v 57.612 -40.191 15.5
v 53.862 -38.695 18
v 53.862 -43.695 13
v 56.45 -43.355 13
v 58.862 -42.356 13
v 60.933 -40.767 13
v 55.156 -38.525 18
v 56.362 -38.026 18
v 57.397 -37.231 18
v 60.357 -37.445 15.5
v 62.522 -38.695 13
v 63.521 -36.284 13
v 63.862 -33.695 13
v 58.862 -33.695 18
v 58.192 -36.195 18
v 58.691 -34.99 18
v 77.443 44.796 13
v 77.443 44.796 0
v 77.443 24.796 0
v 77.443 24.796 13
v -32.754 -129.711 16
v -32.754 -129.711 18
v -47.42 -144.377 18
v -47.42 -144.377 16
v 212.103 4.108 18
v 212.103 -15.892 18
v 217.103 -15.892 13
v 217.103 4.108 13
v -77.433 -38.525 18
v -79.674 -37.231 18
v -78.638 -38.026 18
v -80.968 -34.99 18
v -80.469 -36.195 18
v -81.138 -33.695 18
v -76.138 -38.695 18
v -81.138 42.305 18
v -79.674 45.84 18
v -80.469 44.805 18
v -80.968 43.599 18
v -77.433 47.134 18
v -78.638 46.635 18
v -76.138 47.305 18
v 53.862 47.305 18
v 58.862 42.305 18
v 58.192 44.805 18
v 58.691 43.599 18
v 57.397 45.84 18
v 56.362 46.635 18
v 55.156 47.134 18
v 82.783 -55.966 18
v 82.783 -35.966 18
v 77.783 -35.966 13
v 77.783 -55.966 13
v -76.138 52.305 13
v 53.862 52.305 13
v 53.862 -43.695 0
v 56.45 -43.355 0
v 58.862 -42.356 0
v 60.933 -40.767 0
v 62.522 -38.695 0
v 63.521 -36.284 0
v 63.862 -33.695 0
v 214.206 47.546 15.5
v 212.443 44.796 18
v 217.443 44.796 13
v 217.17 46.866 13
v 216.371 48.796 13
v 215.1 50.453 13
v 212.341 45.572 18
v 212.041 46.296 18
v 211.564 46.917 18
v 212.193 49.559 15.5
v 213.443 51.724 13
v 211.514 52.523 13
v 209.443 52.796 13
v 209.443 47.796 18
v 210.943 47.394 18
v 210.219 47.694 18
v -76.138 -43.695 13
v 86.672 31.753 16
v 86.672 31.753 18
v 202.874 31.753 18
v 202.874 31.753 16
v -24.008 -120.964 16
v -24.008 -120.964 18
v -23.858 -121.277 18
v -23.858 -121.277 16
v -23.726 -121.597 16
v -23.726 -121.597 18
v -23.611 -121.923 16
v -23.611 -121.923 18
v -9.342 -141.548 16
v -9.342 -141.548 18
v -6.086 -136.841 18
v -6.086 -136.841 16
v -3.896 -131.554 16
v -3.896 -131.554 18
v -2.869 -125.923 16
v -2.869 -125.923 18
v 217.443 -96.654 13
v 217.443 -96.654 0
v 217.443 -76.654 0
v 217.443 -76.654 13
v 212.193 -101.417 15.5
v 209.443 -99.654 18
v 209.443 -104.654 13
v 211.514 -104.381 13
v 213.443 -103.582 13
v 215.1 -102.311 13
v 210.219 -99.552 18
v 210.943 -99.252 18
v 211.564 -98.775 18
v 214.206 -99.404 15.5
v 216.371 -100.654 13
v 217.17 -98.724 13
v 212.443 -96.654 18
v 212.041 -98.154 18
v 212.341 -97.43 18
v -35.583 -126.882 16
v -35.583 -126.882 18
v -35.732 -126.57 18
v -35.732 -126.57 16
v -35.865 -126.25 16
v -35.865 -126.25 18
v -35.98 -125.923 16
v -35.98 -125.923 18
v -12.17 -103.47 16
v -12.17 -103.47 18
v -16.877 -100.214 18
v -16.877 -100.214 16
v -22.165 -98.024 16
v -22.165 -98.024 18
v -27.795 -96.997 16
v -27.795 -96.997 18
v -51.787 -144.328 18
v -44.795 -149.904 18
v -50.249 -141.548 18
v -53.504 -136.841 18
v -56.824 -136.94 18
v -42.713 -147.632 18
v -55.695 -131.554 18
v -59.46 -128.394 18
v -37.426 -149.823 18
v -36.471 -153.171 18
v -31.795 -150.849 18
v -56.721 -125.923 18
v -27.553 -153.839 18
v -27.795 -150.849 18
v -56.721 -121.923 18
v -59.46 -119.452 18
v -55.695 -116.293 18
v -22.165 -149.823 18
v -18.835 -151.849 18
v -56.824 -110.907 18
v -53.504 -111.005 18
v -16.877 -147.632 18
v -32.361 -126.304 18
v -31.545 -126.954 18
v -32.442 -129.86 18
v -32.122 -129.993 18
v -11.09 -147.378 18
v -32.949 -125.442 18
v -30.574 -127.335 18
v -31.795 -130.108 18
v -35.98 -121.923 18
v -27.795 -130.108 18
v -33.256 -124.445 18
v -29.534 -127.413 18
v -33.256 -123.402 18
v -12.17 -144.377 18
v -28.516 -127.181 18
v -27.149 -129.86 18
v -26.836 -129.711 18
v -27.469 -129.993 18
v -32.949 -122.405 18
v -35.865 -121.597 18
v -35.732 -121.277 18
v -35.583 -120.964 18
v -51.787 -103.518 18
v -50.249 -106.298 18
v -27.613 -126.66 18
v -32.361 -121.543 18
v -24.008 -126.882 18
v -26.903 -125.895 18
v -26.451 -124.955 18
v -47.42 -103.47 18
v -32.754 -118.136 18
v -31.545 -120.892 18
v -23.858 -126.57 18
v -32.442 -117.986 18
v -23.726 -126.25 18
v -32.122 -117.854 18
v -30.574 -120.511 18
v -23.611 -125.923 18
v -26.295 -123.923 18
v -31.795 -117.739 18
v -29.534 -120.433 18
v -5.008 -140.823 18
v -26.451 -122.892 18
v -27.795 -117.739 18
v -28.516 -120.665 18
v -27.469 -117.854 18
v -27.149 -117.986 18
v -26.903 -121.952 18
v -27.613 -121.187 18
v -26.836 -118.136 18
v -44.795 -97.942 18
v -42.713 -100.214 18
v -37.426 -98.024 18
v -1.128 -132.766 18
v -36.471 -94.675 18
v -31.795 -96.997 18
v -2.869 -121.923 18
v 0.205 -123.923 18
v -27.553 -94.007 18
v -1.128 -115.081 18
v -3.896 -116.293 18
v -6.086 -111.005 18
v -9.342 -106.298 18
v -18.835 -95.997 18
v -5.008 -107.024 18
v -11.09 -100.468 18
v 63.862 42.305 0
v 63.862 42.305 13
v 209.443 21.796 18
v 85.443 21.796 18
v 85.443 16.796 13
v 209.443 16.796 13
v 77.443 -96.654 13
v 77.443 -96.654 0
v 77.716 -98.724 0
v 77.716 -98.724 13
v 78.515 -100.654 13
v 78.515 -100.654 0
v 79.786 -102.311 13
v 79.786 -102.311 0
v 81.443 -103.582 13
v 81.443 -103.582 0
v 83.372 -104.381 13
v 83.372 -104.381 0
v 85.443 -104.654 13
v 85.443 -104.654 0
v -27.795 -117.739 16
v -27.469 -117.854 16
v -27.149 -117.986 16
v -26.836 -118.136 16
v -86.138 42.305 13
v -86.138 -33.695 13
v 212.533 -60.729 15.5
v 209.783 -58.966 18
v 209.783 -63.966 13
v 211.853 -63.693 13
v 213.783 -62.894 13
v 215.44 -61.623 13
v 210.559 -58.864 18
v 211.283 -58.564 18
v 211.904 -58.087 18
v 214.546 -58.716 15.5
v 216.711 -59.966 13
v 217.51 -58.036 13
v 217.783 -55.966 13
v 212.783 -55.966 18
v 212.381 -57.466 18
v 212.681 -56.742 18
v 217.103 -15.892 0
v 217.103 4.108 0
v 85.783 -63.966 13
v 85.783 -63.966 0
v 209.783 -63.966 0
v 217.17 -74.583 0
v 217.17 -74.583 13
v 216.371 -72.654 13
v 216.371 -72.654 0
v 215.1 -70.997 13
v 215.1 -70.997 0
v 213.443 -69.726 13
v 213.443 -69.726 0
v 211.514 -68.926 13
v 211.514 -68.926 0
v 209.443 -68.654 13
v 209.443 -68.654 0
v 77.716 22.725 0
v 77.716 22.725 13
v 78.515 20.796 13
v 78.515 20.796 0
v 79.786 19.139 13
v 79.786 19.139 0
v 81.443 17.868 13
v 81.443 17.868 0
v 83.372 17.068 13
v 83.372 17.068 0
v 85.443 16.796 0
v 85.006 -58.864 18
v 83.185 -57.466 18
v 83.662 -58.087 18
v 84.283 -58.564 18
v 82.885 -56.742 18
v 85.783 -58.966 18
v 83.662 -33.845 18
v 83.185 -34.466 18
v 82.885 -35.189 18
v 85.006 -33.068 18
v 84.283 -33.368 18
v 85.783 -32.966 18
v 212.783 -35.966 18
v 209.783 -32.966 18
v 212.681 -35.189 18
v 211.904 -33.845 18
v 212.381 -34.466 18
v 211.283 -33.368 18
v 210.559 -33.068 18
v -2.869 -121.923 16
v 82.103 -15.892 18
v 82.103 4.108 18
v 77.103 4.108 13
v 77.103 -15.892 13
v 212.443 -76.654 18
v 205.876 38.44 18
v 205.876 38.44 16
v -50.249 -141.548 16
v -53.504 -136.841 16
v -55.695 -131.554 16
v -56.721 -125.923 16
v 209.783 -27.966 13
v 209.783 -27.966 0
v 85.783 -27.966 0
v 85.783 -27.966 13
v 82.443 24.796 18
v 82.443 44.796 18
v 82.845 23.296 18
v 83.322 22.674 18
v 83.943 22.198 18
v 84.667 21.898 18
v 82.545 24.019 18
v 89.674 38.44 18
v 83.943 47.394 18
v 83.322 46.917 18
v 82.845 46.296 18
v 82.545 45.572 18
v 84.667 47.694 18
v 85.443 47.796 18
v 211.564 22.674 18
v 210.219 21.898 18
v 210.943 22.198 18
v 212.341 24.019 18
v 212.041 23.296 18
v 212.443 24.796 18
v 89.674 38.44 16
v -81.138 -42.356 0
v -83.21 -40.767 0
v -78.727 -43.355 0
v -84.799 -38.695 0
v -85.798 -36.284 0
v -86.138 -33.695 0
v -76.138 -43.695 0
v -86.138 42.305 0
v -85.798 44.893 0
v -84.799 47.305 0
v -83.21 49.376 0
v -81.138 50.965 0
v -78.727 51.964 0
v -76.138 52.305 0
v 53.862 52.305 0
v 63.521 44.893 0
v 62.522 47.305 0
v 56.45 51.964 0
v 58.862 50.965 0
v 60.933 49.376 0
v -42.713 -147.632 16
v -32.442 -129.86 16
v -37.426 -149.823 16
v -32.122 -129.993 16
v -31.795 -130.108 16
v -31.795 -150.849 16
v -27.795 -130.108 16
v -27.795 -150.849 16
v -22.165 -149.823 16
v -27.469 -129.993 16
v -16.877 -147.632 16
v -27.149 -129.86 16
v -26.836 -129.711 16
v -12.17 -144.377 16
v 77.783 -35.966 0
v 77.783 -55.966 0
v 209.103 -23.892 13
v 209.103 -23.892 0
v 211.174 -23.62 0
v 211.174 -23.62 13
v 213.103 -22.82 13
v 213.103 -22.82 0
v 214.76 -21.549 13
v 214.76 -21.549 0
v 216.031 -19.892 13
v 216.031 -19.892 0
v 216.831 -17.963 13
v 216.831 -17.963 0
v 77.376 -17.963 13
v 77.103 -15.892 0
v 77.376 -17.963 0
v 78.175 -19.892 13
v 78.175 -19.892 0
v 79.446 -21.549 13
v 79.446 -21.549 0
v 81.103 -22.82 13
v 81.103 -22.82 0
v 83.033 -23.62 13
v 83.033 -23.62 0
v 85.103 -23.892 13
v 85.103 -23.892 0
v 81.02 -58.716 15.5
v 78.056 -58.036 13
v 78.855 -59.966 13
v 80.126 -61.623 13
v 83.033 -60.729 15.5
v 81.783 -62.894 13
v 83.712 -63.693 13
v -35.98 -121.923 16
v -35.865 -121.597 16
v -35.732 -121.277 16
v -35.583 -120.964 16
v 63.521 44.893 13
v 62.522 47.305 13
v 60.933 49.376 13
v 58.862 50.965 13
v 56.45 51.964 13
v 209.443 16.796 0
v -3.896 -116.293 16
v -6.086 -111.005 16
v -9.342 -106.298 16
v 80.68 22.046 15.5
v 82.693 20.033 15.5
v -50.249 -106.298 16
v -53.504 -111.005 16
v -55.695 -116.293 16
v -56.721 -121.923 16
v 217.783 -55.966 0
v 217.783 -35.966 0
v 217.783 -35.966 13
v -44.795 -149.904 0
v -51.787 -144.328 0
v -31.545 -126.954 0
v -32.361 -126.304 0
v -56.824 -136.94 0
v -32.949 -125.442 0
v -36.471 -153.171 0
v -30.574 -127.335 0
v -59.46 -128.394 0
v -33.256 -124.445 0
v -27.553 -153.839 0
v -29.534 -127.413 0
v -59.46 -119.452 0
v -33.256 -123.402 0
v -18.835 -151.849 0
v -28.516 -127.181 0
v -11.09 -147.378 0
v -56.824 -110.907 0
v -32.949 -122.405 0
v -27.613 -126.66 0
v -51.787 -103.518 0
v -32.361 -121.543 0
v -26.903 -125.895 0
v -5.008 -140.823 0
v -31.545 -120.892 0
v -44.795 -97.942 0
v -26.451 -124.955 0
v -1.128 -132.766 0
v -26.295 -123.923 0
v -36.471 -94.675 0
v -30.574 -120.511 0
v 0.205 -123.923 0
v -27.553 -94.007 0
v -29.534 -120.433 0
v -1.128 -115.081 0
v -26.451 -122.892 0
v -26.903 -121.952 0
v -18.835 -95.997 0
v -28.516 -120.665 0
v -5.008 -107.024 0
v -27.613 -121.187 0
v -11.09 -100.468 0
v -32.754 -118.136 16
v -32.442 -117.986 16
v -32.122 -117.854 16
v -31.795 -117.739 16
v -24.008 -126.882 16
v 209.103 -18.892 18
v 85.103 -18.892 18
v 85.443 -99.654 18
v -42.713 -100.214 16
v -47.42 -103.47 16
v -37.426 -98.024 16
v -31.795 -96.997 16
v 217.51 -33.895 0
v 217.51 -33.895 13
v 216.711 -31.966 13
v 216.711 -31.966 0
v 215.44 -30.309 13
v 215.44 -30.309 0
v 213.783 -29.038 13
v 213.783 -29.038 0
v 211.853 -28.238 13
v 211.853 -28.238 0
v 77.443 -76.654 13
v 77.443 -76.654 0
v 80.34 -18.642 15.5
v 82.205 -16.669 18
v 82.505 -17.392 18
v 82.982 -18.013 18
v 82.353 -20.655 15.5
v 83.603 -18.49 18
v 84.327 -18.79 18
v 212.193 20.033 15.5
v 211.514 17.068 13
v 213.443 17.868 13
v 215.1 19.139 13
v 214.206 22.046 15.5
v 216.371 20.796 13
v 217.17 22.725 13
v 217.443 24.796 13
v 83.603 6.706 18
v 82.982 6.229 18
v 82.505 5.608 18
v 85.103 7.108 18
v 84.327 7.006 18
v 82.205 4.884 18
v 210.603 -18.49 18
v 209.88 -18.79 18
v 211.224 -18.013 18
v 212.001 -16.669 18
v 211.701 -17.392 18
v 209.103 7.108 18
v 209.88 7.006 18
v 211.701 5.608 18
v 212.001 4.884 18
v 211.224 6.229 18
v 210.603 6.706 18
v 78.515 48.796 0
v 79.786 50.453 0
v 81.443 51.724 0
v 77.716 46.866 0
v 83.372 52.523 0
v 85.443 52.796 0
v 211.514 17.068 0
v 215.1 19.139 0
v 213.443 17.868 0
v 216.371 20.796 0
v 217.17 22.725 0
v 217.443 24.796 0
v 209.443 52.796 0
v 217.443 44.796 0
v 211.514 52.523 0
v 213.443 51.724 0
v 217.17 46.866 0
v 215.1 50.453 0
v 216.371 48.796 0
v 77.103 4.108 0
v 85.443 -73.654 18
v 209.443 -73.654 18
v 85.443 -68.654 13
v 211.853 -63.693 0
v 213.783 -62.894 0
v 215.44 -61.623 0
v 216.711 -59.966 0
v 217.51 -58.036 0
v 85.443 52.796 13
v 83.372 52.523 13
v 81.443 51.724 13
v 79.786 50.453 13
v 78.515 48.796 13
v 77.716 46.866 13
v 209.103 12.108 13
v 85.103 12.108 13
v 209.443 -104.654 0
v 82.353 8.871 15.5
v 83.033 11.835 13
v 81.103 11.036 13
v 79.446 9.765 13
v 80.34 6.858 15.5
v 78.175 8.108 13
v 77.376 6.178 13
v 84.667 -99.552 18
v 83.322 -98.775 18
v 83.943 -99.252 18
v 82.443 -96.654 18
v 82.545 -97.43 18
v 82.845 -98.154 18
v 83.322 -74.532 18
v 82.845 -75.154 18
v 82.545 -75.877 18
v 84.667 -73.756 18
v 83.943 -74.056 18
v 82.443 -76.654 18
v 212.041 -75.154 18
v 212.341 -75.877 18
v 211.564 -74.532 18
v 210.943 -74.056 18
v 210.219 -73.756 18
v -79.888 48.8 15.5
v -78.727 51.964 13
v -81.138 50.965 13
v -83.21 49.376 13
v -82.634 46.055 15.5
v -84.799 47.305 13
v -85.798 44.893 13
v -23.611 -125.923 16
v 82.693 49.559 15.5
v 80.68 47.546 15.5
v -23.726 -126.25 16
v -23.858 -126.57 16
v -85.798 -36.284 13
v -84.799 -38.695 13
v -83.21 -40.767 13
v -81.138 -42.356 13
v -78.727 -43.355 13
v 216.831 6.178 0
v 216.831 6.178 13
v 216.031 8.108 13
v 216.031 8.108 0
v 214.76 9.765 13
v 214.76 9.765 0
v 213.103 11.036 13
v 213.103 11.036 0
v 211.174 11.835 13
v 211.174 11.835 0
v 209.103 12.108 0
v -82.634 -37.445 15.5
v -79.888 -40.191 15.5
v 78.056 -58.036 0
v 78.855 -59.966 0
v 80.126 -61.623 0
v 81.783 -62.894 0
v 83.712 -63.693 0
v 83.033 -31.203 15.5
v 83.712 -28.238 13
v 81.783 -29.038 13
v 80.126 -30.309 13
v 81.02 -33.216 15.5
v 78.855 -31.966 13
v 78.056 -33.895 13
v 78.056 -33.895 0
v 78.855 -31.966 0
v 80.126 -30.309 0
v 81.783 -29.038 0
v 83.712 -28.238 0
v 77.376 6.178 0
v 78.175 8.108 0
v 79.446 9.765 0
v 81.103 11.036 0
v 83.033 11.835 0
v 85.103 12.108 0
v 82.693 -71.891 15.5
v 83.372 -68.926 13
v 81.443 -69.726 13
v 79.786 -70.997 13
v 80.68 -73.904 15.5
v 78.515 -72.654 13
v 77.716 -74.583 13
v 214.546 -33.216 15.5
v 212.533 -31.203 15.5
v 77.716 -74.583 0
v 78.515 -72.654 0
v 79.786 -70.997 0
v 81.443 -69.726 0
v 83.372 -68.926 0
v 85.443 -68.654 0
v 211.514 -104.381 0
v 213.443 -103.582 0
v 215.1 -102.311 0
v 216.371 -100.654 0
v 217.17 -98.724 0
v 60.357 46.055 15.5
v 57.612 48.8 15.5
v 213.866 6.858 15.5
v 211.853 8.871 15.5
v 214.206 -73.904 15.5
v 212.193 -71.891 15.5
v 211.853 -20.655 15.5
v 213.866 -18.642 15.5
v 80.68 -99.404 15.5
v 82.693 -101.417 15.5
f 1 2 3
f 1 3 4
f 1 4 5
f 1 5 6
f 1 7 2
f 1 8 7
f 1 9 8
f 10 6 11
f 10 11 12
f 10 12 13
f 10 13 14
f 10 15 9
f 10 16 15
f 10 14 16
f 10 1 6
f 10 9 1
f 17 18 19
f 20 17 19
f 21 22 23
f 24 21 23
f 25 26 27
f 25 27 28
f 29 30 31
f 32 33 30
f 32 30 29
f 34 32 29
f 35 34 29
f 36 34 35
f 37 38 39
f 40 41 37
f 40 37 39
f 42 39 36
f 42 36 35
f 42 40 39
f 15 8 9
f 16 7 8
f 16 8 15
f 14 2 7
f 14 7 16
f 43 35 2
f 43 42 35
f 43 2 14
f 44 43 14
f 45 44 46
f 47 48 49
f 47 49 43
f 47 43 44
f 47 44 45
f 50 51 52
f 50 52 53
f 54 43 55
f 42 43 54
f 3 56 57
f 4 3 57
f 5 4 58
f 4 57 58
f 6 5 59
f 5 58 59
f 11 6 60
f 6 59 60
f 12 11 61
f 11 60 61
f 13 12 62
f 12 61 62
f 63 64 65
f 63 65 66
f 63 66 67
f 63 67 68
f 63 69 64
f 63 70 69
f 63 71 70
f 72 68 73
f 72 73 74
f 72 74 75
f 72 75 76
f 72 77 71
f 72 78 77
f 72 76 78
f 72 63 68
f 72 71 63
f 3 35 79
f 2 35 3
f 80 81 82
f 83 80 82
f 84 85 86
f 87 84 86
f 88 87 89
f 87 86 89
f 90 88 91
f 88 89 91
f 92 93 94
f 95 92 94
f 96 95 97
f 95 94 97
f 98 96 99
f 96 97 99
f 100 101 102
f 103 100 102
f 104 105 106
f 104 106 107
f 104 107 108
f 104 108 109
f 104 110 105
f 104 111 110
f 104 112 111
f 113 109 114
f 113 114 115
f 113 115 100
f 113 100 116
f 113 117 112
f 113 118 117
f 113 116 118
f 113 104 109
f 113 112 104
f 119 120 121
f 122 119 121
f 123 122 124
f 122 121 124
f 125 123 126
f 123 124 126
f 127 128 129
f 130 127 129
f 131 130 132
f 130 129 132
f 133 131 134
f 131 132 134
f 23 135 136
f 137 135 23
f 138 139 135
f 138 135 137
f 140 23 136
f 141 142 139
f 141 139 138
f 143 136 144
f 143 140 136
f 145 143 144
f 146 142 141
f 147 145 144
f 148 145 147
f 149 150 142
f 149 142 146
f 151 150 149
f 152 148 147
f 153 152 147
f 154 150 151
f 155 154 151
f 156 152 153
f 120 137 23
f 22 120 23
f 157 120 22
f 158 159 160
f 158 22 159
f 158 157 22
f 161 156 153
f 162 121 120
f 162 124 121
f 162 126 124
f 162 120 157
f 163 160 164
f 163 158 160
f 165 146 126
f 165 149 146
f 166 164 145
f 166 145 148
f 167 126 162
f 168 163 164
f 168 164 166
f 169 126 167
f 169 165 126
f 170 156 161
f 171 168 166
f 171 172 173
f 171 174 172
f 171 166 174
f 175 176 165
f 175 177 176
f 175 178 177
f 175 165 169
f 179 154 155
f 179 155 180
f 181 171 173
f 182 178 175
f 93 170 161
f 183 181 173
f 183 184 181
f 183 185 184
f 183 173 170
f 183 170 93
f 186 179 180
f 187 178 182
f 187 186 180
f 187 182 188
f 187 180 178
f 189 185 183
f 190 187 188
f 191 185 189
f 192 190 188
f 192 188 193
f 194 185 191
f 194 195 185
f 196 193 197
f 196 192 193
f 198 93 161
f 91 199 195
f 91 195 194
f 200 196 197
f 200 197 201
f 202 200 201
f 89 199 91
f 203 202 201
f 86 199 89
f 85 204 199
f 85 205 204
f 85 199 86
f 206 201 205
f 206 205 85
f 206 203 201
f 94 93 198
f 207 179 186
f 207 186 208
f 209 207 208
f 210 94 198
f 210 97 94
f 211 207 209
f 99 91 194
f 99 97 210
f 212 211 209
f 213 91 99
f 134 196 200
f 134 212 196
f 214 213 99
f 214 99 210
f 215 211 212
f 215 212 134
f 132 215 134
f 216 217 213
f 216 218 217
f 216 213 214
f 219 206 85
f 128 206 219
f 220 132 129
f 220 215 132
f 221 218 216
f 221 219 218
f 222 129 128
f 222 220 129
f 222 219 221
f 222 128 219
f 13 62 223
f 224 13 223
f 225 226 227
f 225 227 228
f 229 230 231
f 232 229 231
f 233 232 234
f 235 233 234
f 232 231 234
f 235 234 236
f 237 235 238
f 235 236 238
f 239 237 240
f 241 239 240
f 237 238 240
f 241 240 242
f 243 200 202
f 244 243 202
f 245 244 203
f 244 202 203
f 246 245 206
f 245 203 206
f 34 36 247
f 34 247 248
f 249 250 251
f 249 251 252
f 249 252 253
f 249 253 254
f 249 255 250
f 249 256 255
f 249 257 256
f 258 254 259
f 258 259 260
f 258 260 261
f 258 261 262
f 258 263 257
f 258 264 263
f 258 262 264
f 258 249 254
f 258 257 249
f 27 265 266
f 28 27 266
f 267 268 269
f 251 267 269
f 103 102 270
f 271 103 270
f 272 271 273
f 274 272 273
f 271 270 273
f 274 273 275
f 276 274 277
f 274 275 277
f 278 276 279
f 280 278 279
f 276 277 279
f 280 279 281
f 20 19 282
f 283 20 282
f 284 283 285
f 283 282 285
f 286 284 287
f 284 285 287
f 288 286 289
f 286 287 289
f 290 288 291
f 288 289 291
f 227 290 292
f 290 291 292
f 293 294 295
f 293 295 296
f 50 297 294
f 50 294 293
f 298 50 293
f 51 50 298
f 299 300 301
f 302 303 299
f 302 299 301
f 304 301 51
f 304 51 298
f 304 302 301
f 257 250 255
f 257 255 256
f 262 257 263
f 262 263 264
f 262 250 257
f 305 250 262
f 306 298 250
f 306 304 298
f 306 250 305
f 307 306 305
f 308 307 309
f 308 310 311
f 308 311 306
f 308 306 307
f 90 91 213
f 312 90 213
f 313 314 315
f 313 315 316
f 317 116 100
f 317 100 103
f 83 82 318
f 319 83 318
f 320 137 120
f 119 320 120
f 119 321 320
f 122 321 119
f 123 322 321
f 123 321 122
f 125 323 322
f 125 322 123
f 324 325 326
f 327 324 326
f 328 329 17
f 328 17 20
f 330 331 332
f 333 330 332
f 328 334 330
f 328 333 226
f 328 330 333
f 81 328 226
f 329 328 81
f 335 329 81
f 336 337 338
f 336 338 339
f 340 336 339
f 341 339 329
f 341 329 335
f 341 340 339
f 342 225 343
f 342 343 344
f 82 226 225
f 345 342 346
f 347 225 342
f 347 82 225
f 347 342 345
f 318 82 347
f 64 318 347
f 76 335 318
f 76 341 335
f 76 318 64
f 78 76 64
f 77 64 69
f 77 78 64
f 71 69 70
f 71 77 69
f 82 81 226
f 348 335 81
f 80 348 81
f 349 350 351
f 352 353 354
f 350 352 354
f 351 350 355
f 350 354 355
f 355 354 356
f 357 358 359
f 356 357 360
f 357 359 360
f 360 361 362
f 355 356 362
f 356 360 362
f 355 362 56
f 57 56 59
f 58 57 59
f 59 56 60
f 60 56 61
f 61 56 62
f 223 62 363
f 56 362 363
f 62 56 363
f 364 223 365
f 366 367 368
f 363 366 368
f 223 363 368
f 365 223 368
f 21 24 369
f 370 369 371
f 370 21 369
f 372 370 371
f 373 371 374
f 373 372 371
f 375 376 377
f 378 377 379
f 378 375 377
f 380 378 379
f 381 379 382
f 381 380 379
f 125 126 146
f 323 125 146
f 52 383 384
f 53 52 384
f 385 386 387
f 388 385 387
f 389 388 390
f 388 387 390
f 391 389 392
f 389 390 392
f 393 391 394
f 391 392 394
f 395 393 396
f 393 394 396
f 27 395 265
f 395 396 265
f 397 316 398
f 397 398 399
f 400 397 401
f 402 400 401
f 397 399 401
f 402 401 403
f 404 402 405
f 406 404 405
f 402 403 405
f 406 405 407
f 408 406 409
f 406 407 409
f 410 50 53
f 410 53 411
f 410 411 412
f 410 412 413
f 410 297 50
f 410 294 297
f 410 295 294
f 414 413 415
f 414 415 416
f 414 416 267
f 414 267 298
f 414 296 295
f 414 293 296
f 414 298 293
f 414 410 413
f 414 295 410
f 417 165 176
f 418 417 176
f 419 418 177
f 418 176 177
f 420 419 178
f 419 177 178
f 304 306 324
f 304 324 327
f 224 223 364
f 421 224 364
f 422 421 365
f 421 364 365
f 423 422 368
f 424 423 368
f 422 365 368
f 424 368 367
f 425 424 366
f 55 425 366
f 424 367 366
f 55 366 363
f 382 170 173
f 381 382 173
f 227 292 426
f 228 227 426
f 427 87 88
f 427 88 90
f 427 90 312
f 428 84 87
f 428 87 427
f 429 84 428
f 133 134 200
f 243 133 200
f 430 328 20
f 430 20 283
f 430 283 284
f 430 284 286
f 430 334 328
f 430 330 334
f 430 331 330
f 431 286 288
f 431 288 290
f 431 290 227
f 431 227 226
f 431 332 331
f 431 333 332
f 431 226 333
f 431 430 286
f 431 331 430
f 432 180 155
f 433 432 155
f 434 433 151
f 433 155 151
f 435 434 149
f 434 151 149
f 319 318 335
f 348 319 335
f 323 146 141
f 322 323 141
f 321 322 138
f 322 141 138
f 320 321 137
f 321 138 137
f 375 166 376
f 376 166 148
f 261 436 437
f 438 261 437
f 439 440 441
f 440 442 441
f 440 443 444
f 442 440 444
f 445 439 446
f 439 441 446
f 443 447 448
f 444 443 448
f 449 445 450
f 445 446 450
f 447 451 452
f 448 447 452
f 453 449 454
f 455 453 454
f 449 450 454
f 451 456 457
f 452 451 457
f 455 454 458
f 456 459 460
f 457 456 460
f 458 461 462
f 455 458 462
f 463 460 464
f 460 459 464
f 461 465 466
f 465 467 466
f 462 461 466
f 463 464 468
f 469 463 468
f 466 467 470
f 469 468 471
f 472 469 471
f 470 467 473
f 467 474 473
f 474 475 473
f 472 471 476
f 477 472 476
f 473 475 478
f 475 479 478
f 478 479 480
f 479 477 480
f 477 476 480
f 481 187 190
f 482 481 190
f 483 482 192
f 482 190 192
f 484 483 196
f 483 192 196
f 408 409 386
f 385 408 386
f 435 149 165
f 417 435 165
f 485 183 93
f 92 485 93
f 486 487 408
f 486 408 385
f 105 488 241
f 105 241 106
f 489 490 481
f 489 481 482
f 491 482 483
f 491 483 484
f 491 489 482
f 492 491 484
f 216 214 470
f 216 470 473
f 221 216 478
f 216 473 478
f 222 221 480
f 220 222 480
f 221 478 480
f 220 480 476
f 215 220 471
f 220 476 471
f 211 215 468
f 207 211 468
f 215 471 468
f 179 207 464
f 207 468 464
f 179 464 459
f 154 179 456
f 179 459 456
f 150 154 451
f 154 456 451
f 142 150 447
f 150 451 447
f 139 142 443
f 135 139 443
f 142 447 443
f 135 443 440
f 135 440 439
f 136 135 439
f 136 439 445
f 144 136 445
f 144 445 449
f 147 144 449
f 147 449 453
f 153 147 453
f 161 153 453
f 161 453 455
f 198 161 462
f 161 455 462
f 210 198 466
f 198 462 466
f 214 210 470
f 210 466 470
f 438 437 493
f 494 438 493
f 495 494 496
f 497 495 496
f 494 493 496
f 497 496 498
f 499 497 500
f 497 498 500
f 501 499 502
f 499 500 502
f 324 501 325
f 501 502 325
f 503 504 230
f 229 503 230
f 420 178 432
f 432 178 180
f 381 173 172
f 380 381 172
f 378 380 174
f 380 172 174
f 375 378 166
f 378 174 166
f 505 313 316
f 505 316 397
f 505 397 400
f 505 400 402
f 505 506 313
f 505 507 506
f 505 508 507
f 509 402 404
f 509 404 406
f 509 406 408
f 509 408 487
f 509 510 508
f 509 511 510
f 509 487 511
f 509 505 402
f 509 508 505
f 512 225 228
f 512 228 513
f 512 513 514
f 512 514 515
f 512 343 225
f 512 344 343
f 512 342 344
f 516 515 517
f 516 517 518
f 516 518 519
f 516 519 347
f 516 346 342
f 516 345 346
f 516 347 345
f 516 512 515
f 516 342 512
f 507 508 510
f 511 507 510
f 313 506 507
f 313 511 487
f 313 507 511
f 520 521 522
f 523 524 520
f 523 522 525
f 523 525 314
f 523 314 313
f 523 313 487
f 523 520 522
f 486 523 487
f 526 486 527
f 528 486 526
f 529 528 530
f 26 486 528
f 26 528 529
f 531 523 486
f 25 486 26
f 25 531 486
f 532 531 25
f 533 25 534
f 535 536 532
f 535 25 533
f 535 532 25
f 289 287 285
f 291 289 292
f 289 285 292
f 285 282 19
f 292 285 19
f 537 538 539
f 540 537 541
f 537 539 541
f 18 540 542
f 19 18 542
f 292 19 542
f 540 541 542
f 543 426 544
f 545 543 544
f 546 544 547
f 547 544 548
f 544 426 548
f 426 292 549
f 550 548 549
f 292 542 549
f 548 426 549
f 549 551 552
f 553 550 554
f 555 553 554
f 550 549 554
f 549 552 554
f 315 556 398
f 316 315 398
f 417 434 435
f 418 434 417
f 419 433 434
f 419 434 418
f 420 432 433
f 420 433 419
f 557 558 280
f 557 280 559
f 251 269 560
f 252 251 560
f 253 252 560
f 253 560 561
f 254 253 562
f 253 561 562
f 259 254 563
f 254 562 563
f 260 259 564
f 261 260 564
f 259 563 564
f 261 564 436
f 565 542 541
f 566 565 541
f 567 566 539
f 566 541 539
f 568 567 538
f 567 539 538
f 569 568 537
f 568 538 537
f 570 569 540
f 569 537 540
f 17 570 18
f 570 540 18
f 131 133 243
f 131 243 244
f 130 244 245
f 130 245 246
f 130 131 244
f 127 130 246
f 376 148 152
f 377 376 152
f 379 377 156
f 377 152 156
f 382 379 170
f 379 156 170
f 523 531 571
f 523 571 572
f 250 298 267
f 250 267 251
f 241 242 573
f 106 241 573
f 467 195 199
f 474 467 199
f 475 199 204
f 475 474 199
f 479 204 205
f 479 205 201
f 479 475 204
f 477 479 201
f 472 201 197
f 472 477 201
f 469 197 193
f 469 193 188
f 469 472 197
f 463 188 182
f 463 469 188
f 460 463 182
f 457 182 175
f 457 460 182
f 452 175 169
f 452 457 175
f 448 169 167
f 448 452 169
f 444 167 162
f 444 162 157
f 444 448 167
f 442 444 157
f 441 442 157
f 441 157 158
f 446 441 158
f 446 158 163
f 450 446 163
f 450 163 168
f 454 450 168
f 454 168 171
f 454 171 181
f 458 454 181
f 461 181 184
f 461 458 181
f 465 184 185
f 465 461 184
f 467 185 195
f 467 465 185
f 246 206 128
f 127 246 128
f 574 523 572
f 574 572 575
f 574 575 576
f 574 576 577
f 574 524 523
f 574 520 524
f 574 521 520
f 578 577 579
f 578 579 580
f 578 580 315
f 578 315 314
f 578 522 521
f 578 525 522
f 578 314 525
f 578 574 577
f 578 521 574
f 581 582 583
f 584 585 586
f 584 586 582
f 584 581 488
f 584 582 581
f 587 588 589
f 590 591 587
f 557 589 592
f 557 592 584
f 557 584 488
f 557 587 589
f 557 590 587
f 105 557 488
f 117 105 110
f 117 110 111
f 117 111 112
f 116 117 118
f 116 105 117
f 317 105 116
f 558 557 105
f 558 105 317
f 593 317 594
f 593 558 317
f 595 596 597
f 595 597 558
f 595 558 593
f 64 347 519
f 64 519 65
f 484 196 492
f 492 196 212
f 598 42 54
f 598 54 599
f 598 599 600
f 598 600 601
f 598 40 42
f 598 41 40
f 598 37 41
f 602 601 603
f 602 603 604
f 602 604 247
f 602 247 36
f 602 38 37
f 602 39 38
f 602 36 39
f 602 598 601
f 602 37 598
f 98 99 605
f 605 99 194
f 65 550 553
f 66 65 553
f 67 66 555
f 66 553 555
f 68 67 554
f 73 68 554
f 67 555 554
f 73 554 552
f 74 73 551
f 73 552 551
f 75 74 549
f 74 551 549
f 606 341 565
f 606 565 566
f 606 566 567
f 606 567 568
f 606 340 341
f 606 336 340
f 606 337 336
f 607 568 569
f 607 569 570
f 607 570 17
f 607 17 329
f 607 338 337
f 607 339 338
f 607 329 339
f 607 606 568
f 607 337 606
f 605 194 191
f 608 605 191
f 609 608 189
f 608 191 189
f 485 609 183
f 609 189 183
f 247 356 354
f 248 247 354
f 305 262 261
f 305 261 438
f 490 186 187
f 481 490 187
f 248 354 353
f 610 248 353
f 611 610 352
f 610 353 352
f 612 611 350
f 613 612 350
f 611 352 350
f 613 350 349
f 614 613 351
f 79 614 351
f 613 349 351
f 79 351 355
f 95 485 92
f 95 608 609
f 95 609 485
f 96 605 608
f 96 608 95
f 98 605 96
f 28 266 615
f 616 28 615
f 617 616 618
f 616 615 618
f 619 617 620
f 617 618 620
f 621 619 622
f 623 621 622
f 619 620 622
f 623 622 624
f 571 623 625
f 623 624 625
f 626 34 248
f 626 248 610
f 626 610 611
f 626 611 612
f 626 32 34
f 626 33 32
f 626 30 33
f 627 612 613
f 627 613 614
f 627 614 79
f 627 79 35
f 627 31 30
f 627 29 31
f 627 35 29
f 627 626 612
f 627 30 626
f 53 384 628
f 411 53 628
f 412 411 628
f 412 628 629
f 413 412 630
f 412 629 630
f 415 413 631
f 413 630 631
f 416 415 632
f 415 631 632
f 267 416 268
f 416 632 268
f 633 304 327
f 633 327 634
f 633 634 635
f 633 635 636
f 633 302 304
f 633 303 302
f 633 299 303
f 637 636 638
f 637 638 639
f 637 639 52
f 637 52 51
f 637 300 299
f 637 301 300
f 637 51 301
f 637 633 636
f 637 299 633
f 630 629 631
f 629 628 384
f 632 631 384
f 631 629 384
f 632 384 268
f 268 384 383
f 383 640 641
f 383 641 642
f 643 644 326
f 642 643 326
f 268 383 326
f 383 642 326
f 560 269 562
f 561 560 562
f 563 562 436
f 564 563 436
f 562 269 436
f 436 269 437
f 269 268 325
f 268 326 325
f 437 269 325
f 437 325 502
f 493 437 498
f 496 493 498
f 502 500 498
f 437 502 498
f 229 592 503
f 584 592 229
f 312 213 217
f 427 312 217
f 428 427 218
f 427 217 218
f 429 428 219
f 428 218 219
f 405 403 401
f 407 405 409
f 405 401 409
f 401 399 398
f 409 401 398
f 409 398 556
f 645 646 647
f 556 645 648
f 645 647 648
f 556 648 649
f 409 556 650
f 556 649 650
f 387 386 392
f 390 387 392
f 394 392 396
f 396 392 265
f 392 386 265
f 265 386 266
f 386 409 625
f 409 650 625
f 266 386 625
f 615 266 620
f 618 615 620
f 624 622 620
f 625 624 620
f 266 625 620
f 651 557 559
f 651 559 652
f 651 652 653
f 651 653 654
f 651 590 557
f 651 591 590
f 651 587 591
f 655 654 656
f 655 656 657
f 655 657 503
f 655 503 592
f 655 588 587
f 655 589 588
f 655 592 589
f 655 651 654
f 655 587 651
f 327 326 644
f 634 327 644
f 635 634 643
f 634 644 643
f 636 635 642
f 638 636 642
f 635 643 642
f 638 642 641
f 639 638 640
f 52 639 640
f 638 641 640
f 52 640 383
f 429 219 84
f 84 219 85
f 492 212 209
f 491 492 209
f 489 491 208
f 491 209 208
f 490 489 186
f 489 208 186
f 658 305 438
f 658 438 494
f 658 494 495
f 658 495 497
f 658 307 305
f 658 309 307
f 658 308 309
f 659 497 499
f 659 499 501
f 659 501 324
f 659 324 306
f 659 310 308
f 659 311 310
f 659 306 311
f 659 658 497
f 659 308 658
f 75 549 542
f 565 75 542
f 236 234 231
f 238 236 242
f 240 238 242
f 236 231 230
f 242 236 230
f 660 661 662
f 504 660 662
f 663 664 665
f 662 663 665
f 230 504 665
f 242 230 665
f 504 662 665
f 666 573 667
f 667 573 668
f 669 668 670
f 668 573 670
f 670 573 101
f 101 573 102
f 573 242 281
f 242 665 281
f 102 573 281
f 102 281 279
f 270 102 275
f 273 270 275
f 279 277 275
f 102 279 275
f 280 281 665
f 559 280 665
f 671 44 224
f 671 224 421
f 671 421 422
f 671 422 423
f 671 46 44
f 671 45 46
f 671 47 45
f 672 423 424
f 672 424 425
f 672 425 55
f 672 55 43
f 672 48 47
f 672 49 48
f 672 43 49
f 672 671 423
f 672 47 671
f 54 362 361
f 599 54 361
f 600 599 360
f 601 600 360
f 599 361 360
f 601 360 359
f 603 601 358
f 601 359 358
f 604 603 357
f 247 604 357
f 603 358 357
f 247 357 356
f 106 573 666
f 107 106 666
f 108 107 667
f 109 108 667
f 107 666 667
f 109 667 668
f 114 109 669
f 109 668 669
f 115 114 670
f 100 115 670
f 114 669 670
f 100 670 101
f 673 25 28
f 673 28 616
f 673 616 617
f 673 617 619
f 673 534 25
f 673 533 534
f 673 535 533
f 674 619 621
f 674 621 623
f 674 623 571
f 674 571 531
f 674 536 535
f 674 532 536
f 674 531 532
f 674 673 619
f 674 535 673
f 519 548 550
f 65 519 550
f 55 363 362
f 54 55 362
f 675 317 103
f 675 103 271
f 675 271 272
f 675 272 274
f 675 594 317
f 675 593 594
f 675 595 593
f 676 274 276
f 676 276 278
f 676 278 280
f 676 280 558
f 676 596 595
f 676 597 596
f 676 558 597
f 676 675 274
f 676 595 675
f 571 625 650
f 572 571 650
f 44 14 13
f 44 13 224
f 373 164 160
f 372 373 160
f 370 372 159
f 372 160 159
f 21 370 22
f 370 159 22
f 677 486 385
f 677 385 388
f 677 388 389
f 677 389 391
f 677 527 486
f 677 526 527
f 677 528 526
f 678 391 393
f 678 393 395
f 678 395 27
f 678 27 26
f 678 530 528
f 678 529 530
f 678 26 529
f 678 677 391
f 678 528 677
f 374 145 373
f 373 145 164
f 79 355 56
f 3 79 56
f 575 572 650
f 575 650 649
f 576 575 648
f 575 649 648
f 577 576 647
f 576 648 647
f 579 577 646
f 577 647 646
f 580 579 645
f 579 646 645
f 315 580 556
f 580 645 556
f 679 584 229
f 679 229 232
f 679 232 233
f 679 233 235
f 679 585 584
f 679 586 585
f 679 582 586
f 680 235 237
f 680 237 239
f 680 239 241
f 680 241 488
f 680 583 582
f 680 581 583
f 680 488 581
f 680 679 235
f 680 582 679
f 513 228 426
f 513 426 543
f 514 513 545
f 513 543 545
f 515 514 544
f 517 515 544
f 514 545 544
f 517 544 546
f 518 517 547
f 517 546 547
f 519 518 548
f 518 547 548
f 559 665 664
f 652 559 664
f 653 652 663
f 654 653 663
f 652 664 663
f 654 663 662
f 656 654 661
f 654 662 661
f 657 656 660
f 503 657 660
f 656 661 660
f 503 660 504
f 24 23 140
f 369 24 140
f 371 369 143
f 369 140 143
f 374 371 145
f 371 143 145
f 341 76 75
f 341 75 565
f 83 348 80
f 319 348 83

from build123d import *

# Parameters (mm, degrees)
F1_DEPTH = 18
F2_SIZE  = 5
F5_DEPTH = 2
F6_R     = 30
F6_R_2   = 3.5
F7_DEPTH = 18
F9_DEPTH = 2


with BuildPart() as f1:
    # F0 (on Top) → F1 (new body)
    with BuildSketch(Plane.XY):
        with BuildLine():
            Line((53.86152, 52.304515), (-76.13848, 52.304515))
            ThreePointArc((-76.13848, 52.304515), (-83.209548, 49.375583), (-86.13848, 42.304515))
            Line((-86.13848, 42.304515), (-86.13848, -33.695485))
            ThreePointArc((-86.13848, -33.695485), (-83.209548, -40.766553), (-76.13848, -43.695485))
            Line((-76.13848, -43.695485), (53.86152, -43.695485))
            ThreePointArc((53.86152, -43.695485), (60.932588, -40.766553), (63.86152, -33.695485))
            Line((63.86152, -33.695485), (63.86152, 42.304515))
            ThreePointArc((63.86152, 42.304515), (60.932588, 49.375583), (53.86152, 52.304515))
        make_face()
        with BuildLine():
            Line((209.443026, 52.79577), (85.443026, 52.79577))
            ThreePointArc((85.443026, 52.79577), (79.786172, 50.452624), (77.443026, 44.79577))
            Line((77.443026, 44.79577), (77.443026, 24.79577))
            ThreePointArc((77.443026, 24.79577), (79.786172, 19.138916), (85.443026, 16.79577))
            Line((85.443026, 16.79577), (209.443026, 16.79577))
            ThreePointArc((209.443026, 16.79577), (215.09988, 19.138916), (217.443026, 24.79577))
            Line((217.443026, 24.79577), (217.443026, 44.79577))
            ThreePointArc((217.443026, 44.79577), (215.09988, 50.452624), (209.443026, 52.79577))
        make_face()
        with BuildLine():
            Line((209.103125, 12.1079), (85.103125, 12.1079))
            ThreePointArc((85.103125, 12.1079), (79.446271, 9.764754), (77.103125, 4.1079))
            Line((77.103125, 4.1079), (77.103125, -15.8921))
            ThreePointArc((77.103125, -15.8921), (79.446271, -21.548954), (85.103125, -23.8921))
            Line((85.103125, -23.8921), (209.103125, -23.8921))
            ThreePointArc((209.103125, -23.8921), (214.759979, -21.548954), (217.103125, -15.8921))
            Line((217.103125, -15.8921), (217.103125, 4.1079))
            ThreePointArc((217.103125, 4.1079), (214.759979, 9.764754), (209.103125, 12.1079))
        make_face()
        with BuildLine():
            Line((209.782927, -27.965898), (85.782927, -27.965898))
            ThreePointArc((85.782927, -27.965898), (80.126073, -30.309044), (77.782927, -35.965898))
            Line((77.782927, -35.965898), (77.782927, -55.965898))
            ThreePointArc((77.782927, -55.965898), (80.126073, -61.622753), (85.782927, -63.965898))
            Line((85.782927, -63.965898), (209.782927, -63.965898))
            ThreePointArc((209.782927, -63.965898), (215.439781, -61.622753), (217.782927, -55.965898))
            Line((217.782927, -55.965898), (217.782927, -35.965898))
            ThreePointArc((217.782927, -35.965898), (215.439781, -30.309044), (209.782927, -27.965898))
        make_face()
        with BuildLine():
            Line((209.443026, -68.653768), (85.443026, -68.653768))
            ThreePointArc((85.443026, -68.653768), (79.786172, -70.996914), (77.443026, -76.653768))
            Line((77.443026, -76.653768), (77.443026, -96.653768))
            ThreePointArc((77.443026, -96.653768), (79.786172, -102.310622), (85.443026, -104.653768))
            Line((85.443026, -104.653768), (209.443026, -104.653768))
            ThreePointArc((209.443026, -104.653768), (215.09988, -102.310622), (217.443026, -96.653768))
            Line((217.443026, -96.653768), (217.443026, -76.653768))
            ThreePointArc((217.443026, -76.653768), (215.09988, -70.996914), (209.443026, -68.653768))
        make_face()
    extrude(amount=F1_DEPTH)

    # F2
    f2_edges = [f1.edges().sort_by_distance(p)[0] for p in [
        (-11.13848, 52.304515, 18),
        (-83.209548, 49.375583, 18),
        (-86.13848, 4.304515, 18),
        (-83.209548, -40.766553, 18),
        (-11.13848, -43.695485, 18),
        (60.932588, -40.766553, 18),
        (63.86152, 4.304515, 18),
        (60.932588, 49.375583, 18),
        (147.443026, 52.79577, 18),
        (79.786172, 50.452624, 18),
        (77.443026, 34.79577, 18),
        (79.786172, 19.138916, 18),
        (147.443026, 16.79577, 18),
        (215.09988, 19.138916, 18),
        (217.443026, 34.79577, 18),
        (215.09988, 50.452624, 18),
        (147.103125, 12.1079, 18),
        (79.446271, 9.764754, 18),
        (77.103125, -5.8921, 18),
        (79.446271, -21.548954, 18),
        (147.103125, -23.8921, 18),
        (214.759979, -21.548954, 18),
        (217.103125, -5.8921, 18),
        (214.759979, 9.764754, 18),
        (147.782927, -27.965898, 18),
        (80.126073, -30.309044, 18),
        (77.782927, -45.965898, 18),
        (80.126073, -61.622753, 18),
        (147.782927, -63.965898, 18),
        (215.439781, -61.622753, 18),
        (217.782927, -45.965898, 18),
        (215.439781, -30.309044, 18),
        (147.443026, -68.653768, 18),
        (79.786172, -70.996914, 18),
        (77.443026, -86.653768, 18),
        (79.786172, -102.310622, 18),
        (147.443026, -104.653768, 18),
        (215.09988, -102.310622, 18),
        (217.443026, -86.653768, 18),
        (215.09988, -70.996914, 18),
    ]]
    chamfer(f2_edges, length=F2_SIZE)

    # F4 (on face) → F5 (cut)
    with BuildSketch(Plane.XY.offset(18)):
        Polygon((205.875951, 38.439858), (89.673807, 38.439858), (86.671706, 31.753361), (202.87385, 31.753361), align=None)
    extrude(amount=-F5_DEPTH, mode=Mode.SUBTRACT)


with BuildPart() as f7:
    # F6 (on Top) → F7 (new body)
    with BuildSketch(Plane.XY):
        with Locations((-29.795188, -123.92322)):
            Circle(F6_R)
        with Locations((-29.795188, -123.92322)):
            Circle(F6_R_2, mode=Mode.SUBTRACT)
    extrude(amount=F7_DEPTH)

    # F8 (on face) → F9 (cut)
    with BuildSketch(Plane.XY.offset(18)):
        with BuildLine():
            Line((-26.836188, -118.135792), (-12.169969, -103.469573))
            ThreePointArc((-12.169969, -103.469573), (-19.462736, -98.978472), (-27.795188, -96.997396))
            Line((-27.795188, -96.997396), (-27.795188, -117.738561))
            ThreePointArc((-27.795188, -117.738561), (-27.307746, -117.918003), (-26.836188, -118.135792))
        make_face()
        with BuildLine():
            Line((-47.420408, -103.469573), (-32.754189, -118.135792))
            ThreePointArc((-32.754189, -118.135792), (-32.282631, -117.918003), (-31.795188, -117.738561))
            Line((-31.795188, -117.738561), (-31.795188, -96.997396))
            ThreePointArc((-31.795188, -96.997396), (-40.127641, -98.978472), (-47.420408, -103.469573))
        make_face()
        with BuildLine():
            ThreePointArc((-2.869364, -121.92322), (-4.850441, -113.590767), (-9.341542, -106.298001))
            Line((-9.341542, -106.298001), (-24.007761, -120.964219))
            ThreePointArc((-24.007761, -120.964219), (-23.789971, -121.435777), (-23.61053, -121.92322))
            Line((-23.61053, -121.92322), (-2.869364, -121.92322))
        make_face()
        with BuildLine():
            Line((-24.007761, -126.88222), (-9.341542, -141.548439))
            ThreePointArc((-9.341542, -141.548439), (-4.850441, -134.255672), (-2.869364, -125.92322))
            Line((-2.869364, -125.92322), (-23.61053, -125.92322))
            ThreePointArc((-23.61053, -125.92322), (-23.789971, -126.410662), (-24.007761, -126.88222))
        make_face()
        with BuildLine():
            ThreePointArc((-27.795188, -150.849044), (-19.462736, -148.867967), (-12.169969, -144.376866))
            Line((-12.169969, -144.376866), (-26.836188, -129.710647))
            ThreePointArc((-26.836188, -129.710647), (-27.307746, -129.928437), (-27.795188, -130.107878))
            Line((-27.795188, -130.107878), (-27.795188, -150.849044))
        make_face()
        with BuildLine():
            Line((-32.754189, -129.710647), (-47.420408, -144.376866))
            ThreePointArc((-47.420408, -144.376866), (-40.127641, -148.867967), (-31.795188, -150.849044))
            Line((-31.795188, -150.849044), (-31.795188, -130.107878))
            ThreePointArc((-31.795188, -130.107878), (-32.282631, -129.928437), (-32.754189, -129.710647))
        make_face()
        with BuildLine():
            ThreePointArc((-35.582616, -126.88222), (-35.800405, -126.410662), (-35.979847, -125.92322))
            Line((-35.979847, -125.92322), (-56.721012, -125.92322))
            ThreePointArc((-56.721012, -125.92322), (-54.739936, -134.255672), (-50.248835, -141.548439))
            Line((-50.248835, -141.548439), (-35.582616, -126.88222))
        make_face()
        with BuildLine():
            Line((-56.721012, -121.92322), (-35.979847, -121.92322))
            ThreePointArc((-35.979847, -121.92322), (-35.800405, -121.435777), (-35.582616, -120.964219))
            Line((-35.582616, -120.964219), (-50.248835, -106.298001))
            ThreePointArc((-50.248835, -106.298001), (-54.739936, -113.590767), (-56.721012, -121.92322))
        make_face()
    extrude(amount=-F9_DEPTH, mode=Mode.SUBTRACT)


solid = Compound([f1.part, f7.part])
